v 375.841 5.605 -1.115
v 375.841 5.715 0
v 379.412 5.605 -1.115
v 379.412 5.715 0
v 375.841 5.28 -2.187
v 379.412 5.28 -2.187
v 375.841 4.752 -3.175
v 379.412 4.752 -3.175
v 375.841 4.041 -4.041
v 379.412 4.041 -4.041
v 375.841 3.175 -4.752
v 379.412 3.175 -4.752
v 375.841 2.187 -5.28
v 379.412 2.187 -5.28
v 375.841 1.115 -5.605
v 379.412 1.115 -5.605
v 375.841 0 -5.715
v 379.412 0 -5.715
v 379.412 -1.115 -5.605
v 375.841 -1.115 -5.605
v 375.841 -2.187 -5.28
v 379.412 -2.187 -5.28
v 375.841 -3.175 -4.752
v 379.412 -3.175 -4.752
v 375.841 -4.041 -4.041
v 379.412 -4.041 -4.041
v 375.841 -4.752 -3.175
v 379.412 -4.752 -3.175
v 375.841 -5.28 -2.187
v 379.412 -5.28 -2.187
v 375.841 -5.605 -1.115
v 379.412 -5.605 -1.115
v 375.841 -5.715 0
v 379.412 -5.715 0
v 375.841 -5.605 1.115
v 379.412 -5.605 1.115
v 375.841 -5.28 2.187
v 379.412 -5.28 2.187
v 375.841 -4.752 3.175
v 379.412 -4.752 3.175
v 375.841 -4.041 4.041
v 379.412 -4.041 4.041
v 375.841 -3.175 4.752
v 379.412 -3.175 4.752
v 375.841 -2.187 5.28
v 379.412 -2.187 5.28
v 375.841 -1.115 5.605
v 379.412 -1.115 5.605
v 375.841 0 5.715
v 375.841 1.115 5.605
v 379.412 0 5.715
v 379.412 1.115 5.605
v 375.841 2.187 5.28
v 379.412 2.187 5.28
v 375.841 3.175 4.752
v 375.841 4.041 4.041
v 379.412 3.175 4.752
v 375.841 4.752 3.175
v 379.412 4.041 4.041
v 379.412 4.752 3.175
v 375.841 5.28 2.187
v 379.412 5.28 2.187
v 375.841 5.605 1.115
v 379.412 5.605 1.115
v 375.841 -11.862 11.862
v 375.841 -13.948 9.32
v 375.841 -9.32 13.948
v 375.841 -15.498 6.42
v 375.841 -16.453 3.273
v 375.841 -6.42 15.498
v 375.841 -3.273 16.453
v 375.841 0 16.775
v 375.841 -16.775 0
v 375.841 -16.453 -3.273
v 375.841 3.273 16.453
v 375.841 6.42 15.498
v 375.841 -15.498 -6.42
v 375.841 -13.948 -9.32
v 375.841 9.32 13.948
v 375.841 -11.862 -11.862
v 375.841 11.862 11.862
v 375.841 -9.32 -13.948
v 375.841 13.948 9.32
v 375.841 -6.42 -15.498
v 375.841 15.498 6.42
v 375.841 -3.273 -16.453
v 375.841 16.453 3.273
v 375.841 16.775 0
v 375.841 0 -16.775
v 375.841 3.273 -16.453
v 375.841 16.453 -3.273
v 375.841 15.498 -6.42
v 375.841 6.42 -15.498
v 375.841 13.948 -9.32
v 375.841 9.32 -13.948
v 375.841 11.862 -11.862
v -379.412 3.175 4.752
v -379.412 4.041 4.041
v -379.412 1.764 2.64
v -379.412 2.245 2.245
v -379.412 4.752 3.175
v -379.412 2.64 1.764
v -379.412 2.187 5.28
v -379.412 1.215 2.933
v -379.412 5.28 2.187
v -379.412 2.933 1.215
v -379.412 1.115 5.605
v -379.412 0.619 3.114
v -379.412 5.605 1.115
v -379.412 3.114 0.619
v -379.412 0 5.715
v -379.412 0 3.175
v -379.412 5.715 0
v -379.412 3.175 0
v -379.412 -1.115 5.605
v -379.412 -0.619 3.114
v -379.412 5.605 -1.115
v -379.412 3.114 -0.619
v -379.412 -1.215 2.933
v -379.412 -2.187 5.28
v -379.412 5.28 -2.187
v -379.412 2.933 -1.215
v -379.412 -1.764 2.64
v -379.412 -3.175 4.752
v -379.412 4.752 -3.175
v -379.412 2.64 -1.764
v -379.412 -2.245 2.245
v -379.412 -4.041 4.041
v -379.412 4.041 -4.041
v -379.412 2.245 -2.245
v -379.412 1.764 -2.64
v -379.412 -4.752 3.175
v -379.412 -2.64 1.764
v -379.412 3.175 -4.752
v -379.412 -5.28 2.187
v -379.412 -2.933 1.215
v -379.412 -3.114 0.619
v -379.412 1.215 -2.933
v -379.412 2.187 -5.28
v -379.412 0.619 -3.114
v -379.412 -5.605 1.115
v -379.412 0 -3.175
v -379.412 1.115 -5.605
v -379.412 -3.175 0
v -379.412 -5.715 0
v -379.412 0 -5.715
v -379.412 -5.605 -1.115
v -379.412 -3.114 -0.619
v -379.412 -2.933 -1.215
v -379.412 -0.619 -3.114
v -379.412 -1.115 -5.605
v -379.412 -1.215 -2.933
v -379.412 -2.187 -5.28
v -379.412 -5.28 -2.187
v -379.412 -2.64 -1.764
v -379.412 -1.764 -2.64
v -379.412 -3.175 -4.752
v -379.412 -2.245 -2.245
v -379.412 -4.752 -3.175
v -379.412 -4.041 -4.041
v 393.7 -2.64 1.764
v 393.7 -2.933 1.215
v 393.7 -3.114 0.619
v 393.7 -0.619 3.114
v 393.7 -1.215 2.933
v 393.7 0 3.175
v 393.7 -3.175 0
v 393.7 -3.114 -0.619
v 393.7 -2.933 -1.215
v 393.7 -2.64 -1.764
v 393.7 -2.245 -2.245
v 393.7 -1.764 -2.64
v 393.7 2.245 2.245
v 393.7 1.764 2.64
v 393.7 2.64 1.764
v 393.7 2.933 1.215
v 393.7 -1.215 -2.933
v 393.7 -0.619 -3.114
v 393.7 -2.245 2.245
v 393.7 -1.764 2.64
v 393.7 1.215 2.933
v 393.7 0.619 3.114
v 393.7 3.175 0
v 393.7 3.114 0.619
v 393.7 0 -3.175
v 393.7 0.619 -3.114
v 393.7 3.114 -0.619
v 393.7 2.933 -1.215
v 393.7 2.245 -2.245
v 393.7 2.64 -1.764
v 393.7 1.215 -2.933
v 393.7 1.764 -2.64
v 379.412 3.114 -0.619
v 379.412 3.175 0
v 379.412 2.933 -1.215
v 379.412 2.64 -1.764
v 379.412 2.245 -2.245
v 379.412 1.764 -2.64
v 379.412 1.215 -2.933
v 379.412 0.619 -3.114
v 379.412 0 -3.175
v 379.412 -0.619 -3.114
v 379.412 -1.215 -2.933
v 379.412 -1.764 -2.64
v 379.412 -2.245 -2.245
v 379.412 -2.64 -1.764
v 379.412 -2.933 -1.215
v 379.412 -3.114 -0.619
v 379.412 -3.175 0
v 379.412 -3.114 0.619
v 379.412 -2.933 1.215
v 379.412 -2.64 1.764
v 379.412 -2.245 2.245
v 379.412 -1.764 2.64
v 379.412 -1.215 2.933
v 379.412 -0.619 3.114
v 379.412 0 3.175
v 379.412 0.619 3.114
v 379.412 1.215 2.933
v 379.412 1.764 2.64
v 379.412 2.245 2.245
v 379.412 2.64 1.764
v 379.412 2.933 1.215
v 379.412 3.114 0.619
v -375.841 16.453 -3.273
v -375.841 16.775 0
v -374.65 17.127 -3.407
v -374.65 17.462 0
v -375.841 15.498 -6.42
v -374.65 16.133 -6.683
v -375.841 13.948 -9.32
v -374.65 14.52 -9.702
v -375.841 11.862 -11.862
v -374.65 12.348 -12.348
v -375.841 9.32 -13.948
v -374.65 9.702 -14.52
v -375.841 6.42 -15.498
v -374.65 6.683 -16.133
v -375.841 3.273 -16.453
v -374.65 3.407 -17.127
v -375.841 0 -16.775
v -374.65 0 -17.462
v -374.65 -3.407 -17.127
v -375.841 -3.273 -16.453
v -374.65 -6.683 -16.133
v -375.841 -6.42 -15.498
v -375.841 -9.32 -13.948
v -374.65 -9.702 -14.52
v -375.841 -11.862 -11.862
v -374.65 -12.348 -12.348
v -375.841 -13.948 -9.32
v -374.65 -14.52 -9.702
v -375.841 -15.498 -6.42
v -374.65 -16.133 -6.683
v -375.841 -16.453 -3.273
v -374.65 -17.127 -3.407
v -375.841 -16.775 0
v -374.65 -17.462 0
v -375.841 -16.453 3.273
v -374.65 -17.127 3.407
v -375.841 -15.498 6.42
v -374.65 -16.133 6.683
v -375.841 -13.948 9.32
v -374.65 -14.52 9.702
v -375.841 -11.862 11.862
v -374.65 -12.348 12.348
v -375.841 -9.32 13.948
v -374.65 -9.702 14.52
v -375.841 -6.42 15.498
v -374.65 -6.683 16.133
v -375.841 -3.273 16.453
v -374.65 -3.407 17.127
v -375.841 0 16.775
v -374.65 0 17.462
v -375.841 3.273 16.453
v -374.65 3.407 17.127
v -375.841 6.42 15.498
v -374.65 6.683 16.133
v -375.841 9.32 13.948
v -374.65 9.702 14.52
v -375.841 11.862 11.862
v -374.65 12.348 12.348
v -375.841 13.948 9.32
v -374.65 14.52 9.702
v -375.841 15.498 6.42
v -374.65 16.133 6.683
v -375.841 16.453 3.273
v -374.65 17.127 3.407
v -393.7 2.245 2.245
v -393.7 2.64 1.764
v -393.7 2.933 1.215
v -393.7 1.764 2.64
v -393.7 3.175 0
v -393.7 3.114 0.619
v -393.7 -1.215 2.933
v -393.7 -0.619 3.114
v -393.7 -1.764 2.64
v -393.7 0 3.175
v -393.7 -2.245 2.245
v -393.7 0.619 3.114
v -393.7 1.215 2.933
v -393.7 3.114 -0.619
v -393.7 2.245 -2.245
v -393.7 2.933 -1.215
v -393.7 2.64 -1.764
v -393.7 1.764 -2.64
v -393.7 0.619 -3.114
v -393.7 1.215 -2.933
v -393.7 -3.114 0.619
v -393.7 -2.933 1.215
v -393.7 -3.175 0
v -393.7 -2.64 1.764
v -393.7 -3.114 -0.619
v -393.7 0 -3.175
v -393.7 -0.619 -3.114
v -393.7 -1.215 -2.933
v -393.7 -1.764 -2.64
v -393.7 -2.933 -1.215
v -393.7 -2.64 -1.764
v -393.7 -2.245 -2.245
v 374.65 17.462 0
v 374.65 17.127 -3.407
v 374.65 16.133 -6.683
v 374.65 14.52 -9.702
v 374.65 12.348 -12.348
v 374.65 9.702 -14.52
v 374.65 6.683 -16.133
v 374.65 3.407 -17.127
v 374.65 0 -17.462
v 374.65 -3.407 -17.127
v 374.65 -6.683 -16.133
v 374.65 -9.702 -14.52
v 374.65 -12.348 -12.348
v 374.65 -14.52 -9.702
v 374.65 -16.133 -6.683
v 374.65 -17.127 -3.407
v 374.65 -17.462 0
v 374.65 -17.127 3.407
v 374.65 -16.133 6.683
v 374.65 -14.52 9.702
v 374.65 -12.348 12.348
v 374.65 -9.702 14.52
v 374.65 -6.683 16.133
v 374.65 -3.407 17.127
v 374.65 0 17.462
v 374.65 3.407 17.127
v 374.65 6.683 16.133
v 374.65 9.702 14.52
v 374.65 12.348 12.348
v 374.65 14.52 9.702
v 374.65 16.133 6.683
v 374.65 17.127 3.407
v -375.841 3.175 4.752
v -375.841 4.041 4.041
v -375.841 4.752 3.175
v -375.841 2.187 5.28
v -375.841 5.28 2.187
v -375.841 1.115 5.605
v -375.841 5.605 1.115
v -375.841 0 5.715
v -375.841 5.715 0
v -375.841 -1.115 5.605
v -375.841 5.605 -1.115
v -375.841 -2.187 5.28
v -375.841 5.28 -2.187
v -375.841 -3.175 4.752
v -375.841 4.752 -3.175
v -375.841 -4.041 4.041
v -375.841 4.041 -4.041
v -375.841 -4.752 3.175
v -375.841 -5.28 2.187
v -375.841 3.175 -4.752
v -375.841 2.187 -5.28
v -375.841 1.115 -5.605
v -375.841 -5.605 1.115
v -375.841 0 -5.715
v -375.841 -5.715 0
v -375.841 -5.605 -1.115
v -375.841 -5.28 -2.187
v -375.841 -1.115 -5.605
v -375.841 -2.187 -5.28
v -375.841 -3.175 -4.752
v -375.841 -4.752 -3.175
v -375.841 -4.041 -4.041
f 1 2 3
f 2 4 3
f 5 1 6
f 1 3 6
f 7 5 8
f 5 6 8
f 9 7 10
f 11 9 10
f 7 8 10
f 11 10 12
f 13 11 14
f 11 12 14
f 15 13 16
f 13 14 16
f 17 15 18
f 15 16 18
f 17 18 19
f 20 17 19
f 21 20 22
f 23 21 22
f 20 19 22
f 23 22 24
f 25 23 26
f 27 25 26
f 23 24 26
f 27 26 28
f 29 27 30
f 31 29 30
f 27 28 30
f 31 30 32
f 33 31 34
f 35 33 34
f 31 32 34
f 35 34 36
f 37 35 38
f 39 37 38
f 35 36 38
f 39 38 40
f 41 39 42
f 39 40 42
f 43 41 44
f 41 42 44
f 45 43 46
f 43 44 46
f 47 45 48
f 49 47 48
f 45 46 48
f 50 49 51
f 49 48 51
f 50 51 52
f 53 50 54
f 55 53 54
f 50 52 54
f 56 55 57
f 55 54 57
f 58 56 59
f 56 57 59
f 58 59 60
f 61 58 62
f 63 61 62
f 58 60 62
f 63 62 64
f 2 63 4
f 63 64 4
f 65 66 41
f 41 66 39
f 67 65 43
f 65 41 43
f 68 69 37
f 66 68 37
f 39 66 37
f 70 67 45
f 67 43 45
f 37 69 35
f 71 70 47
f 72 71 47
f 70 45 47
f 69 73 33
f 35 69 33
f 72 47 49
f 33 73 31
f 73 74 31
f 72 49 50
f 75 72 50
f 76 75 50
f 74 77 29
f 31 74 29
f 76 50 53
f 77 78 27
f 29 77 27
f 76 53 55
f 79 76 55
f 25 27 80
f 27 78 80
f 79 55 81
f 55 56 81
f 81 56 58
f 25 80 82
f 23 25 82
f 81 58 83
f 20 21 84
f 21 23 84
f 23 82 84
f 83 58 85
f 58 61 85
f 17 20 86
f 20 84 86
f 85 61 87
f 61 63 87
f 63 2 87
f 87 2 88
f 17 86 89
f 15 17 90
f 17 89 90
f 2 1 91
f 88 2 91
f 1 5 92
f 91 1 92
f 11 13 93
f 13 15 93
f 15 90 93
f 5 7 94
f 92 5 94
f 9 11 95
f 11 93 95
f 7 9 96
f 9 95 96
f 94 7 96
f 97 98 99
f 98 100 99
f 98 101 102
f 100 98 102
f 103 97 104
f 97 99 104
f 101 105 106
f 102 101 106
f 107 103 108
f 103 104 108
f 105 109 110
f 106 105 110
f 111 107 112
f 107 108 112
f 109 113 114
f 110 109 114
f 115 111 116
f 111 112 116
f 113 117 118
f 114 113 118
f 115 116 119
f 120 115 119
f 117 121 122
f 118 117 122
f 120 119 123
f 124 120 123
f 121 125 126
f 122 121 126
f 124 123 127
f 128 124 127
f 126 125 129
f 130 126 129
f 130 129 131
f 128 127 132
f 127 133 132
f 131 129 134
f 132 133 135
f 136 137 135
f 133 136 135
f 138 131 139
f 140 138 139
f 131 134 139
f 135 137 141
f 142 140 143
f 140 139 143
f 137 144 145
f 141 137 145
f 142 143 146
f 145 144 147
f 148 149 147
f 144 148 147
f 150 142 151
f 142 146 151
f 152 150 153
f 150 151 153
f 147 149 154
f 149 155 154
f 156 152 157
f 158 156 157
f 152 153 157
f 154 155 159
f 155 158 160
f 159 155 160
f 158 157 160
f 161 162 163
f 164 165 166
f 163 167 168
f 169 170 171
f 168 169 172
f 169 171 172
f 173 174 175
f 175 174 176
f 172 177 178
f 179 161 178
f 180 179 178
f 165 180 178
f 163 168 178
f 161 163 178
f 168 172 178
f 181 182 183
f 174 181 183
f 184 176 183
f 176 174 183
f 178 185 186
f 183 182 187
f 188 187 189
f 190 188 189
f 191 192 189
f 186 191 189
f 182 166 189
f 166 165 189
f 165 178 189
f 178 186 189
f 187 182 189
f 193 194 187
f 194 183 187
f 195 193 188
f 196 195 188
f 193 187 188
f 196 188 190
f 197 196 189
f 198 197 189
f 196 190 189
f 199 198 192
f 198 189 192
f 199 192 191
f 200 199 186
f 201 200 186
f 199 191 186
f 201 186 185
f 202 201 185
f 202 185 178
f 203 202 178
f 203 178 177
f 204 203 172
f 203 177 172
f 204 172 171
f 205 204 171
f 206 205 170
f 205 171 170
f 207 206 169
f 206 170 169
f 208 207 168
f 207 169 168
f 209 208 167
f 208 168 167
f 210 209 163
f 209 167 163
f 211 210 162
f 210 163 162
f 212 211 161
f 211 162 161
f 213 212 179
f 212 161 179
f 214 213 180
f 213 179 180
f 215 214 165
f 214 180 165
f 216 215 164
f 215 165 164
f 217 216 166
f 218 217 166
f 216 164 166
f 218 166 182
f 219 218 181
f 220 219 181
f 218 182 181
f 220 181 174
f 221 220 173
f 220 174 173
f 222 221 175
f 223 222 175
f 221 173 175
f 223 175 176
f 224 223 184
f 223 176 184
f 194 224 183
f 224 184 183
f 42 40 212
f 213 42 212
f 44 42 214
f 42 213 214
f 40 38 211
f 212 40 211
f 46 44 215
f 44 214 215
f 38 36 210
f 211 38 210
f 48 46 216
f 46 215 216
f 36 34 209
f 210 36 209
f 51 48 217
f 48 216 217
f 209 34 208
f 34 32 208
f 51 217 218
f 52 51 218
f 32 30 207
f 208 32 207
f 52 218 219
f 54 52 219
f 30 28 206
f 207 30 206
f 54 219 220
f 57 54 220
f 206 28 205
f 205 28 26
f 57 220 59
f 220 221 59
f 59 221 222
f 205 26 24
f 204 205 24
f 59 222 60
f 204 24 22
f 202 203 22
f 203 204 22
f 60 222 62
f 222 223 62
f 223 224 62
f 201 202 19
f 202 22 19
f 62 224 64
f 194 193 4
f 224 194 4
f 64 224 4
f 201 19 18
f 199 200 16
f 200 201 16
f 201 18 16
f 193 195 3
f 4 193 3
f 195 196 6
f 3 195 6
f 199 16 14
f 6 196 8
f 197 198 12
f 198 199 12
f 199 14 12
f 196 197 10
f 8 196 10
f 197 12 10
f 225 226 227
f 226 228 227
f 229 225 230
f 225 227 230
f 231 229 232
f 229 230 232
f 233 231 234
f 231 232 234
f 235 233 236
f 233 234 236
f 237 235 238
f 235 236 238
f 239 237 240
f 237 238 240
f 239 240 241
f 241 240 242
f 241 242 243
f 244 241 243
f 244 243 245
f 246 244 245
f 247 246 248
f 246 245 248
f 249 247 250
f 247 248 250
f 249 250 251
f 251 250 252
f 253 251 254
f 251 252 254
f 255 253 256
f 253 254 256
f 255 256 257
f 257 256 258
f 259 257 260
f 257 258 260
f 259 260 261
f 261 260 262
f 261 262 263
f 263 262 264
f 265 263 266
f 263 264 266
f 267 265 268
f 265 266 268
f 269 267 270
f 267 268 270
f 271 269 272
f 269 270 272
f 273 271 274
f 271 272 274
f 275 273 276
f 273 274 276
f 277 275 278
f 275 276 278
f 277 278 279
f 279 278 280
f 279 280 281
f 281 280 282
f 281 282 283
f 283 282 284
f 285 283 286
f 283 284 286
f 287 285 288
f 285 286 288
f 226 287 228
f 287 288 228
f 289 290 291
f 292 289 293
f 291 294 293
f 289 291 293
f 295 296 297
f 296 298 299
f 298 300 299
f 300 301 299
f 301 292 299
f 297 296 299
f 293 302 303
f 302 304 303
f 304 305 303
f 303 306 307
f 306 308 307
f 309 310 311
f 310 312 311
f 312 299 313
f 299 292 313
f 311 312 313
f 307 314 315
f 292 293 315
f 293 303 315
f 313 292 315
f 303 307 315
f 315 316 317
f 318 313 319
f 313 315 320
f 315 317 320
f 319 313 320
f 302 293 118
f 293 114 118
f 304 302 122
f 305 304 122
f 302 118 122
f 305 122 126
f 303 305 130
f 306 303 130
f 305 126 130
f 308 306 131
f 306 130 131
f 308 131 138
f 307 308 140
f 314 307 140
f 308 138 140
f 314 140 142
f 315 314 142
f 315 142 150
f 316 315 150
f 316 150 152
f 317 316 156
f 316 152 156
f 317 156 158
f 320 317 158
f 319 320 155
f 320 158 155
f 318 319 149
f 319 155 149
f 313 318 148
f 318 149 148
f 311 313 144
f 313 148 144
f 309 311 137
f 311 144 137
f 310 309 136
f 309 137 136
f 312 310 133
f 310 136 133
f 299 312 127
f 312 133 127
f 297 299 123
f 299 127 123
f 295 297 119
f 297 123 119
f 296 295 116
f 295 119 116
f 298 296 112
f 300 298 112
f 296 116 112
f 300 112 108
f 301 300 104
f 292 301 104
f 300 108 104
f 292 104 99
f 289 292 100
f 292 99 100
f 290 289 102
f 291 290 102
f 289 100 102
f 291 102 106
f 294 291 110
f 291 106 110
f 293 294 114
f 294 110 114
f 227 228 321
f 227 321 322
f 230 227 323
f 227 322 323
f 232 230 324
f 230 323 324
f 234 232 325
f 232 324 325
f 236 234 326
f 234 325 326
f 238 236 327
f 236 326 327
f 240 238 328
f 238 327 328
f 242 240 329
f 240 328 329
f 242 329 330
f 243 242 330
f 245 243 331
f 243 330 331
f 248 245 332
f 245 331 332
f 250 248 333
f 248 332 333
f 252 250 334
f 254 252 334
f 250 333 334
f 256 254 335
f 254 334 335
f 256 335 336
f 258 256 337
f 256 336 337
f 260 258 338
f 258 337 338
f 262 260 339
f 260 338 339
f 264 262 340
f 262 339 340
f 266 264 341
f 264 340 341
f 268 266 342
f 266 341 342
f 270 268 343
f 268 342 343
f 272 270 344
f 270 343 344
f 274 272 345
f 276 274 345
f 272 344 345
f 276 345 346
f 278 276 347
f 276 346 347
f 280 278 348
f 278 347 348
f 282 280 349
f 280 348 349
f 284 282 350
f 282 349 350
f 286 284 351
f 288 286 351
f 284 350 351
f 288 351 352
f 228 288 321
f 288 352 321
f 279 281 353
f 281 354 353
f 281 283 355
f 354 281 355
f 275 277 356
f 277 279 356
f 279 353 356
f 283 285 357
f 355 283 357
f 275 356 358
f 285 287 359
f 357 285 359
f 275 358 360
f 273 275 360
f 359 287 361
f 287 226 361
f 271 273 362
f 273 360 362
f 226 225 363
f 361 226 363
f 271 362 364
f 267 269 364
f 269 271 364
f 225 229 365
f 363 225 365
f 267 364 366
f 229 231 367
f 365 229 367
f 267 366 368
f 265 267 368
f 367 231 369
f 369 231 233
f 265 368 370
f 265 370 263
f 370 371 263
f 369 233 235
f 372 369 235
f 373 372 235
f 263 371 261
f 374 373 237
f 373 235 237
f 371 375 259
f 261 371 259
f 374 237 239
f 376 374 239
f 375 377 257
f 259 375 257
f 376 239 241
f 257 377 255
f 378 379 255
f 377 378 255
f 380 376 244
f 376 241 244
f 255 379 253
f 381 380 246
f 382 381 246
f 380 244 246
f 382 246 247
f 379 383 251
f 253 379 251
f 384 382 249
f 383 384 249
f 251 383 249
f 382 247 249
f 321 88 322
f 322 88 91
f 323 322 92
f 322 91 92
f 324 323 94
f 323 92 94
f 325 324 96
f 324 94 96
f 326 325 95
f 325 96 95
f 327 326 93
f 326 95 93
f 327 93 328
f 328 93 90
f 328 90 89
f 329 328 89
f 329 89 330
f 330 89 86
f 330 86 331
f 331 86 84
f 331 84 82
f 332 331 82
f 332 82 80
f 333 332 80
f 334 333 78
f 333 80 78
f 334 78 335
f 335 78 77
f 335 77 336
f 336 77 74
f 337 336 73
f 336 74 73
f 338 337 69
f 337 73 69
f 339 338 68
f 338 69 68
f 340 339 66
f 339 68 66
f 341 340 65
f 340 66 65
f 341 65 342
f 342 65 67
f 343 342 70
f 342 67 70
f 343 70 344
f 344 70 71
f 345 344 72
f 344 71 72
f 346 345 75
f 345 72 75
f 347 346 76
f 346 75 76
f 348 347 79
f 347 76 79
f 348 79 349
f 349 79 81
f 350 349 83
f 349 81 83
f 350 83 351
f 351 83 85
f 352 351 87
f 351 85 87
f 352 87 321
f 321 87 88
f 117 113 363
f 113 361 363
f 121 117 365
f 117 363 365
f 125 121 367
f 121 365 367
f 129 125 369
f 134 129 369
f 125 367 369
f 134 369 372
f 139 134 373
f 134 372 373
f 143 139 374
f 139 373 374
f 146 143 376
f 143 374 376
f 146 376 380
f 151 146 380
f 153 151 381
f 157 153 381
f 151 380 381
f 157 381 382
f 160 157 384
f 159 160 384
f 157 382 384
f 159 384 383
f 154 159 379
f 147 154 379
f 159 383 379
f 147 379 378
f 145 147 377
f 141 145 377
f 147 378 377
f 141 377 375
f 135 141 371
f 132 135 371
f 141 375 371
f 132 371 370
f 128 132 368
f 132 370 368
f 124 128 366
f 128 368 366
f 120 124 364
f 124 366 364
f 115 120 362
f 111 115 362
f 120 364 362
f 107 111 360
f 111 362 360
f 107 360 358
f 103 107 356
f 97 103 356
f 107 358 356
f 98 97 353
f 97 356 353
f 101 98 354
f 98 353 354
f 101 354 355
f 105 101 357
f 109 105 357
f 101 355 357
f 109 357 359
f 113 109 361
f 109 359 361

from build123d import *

# Parameters (mm, degrees)
REVOLVE1_ANGLE = 360


with BuildPart() as part:
    # Sketch2 → Revolve1 (revolve, symmetric)
    with BuildSketch(Plane.XY) as revolve1_sk:
        Polygon((-393.7, 0), (-393.7, 3.175), (-379.4125, 3.175), (-379.4125, 5.715), (-375.840625, 5.715), (-375.840625, 16.775092336), (-374.65, 17.4625), (374.65, 17.4625), (375.840625, 16.775092336), (375.840625, 5.715), (379.4125, 5.715), (379.4125, 3.175), (393.7, 3.175), (393.7, 0), align=None)
    revolve(axis=Axis((-393.7, 0, 0), (1, 0, 0)), revolution_arc=REVOLVE1_ANGLE / 2)
    revolve(revolve1_sk.sketch, axis=Axis((-393.7, 0, 0), (-1, 0, 0)), revolution_arc=REVOLVE1_ANGLE / 2)


solid = part.part
